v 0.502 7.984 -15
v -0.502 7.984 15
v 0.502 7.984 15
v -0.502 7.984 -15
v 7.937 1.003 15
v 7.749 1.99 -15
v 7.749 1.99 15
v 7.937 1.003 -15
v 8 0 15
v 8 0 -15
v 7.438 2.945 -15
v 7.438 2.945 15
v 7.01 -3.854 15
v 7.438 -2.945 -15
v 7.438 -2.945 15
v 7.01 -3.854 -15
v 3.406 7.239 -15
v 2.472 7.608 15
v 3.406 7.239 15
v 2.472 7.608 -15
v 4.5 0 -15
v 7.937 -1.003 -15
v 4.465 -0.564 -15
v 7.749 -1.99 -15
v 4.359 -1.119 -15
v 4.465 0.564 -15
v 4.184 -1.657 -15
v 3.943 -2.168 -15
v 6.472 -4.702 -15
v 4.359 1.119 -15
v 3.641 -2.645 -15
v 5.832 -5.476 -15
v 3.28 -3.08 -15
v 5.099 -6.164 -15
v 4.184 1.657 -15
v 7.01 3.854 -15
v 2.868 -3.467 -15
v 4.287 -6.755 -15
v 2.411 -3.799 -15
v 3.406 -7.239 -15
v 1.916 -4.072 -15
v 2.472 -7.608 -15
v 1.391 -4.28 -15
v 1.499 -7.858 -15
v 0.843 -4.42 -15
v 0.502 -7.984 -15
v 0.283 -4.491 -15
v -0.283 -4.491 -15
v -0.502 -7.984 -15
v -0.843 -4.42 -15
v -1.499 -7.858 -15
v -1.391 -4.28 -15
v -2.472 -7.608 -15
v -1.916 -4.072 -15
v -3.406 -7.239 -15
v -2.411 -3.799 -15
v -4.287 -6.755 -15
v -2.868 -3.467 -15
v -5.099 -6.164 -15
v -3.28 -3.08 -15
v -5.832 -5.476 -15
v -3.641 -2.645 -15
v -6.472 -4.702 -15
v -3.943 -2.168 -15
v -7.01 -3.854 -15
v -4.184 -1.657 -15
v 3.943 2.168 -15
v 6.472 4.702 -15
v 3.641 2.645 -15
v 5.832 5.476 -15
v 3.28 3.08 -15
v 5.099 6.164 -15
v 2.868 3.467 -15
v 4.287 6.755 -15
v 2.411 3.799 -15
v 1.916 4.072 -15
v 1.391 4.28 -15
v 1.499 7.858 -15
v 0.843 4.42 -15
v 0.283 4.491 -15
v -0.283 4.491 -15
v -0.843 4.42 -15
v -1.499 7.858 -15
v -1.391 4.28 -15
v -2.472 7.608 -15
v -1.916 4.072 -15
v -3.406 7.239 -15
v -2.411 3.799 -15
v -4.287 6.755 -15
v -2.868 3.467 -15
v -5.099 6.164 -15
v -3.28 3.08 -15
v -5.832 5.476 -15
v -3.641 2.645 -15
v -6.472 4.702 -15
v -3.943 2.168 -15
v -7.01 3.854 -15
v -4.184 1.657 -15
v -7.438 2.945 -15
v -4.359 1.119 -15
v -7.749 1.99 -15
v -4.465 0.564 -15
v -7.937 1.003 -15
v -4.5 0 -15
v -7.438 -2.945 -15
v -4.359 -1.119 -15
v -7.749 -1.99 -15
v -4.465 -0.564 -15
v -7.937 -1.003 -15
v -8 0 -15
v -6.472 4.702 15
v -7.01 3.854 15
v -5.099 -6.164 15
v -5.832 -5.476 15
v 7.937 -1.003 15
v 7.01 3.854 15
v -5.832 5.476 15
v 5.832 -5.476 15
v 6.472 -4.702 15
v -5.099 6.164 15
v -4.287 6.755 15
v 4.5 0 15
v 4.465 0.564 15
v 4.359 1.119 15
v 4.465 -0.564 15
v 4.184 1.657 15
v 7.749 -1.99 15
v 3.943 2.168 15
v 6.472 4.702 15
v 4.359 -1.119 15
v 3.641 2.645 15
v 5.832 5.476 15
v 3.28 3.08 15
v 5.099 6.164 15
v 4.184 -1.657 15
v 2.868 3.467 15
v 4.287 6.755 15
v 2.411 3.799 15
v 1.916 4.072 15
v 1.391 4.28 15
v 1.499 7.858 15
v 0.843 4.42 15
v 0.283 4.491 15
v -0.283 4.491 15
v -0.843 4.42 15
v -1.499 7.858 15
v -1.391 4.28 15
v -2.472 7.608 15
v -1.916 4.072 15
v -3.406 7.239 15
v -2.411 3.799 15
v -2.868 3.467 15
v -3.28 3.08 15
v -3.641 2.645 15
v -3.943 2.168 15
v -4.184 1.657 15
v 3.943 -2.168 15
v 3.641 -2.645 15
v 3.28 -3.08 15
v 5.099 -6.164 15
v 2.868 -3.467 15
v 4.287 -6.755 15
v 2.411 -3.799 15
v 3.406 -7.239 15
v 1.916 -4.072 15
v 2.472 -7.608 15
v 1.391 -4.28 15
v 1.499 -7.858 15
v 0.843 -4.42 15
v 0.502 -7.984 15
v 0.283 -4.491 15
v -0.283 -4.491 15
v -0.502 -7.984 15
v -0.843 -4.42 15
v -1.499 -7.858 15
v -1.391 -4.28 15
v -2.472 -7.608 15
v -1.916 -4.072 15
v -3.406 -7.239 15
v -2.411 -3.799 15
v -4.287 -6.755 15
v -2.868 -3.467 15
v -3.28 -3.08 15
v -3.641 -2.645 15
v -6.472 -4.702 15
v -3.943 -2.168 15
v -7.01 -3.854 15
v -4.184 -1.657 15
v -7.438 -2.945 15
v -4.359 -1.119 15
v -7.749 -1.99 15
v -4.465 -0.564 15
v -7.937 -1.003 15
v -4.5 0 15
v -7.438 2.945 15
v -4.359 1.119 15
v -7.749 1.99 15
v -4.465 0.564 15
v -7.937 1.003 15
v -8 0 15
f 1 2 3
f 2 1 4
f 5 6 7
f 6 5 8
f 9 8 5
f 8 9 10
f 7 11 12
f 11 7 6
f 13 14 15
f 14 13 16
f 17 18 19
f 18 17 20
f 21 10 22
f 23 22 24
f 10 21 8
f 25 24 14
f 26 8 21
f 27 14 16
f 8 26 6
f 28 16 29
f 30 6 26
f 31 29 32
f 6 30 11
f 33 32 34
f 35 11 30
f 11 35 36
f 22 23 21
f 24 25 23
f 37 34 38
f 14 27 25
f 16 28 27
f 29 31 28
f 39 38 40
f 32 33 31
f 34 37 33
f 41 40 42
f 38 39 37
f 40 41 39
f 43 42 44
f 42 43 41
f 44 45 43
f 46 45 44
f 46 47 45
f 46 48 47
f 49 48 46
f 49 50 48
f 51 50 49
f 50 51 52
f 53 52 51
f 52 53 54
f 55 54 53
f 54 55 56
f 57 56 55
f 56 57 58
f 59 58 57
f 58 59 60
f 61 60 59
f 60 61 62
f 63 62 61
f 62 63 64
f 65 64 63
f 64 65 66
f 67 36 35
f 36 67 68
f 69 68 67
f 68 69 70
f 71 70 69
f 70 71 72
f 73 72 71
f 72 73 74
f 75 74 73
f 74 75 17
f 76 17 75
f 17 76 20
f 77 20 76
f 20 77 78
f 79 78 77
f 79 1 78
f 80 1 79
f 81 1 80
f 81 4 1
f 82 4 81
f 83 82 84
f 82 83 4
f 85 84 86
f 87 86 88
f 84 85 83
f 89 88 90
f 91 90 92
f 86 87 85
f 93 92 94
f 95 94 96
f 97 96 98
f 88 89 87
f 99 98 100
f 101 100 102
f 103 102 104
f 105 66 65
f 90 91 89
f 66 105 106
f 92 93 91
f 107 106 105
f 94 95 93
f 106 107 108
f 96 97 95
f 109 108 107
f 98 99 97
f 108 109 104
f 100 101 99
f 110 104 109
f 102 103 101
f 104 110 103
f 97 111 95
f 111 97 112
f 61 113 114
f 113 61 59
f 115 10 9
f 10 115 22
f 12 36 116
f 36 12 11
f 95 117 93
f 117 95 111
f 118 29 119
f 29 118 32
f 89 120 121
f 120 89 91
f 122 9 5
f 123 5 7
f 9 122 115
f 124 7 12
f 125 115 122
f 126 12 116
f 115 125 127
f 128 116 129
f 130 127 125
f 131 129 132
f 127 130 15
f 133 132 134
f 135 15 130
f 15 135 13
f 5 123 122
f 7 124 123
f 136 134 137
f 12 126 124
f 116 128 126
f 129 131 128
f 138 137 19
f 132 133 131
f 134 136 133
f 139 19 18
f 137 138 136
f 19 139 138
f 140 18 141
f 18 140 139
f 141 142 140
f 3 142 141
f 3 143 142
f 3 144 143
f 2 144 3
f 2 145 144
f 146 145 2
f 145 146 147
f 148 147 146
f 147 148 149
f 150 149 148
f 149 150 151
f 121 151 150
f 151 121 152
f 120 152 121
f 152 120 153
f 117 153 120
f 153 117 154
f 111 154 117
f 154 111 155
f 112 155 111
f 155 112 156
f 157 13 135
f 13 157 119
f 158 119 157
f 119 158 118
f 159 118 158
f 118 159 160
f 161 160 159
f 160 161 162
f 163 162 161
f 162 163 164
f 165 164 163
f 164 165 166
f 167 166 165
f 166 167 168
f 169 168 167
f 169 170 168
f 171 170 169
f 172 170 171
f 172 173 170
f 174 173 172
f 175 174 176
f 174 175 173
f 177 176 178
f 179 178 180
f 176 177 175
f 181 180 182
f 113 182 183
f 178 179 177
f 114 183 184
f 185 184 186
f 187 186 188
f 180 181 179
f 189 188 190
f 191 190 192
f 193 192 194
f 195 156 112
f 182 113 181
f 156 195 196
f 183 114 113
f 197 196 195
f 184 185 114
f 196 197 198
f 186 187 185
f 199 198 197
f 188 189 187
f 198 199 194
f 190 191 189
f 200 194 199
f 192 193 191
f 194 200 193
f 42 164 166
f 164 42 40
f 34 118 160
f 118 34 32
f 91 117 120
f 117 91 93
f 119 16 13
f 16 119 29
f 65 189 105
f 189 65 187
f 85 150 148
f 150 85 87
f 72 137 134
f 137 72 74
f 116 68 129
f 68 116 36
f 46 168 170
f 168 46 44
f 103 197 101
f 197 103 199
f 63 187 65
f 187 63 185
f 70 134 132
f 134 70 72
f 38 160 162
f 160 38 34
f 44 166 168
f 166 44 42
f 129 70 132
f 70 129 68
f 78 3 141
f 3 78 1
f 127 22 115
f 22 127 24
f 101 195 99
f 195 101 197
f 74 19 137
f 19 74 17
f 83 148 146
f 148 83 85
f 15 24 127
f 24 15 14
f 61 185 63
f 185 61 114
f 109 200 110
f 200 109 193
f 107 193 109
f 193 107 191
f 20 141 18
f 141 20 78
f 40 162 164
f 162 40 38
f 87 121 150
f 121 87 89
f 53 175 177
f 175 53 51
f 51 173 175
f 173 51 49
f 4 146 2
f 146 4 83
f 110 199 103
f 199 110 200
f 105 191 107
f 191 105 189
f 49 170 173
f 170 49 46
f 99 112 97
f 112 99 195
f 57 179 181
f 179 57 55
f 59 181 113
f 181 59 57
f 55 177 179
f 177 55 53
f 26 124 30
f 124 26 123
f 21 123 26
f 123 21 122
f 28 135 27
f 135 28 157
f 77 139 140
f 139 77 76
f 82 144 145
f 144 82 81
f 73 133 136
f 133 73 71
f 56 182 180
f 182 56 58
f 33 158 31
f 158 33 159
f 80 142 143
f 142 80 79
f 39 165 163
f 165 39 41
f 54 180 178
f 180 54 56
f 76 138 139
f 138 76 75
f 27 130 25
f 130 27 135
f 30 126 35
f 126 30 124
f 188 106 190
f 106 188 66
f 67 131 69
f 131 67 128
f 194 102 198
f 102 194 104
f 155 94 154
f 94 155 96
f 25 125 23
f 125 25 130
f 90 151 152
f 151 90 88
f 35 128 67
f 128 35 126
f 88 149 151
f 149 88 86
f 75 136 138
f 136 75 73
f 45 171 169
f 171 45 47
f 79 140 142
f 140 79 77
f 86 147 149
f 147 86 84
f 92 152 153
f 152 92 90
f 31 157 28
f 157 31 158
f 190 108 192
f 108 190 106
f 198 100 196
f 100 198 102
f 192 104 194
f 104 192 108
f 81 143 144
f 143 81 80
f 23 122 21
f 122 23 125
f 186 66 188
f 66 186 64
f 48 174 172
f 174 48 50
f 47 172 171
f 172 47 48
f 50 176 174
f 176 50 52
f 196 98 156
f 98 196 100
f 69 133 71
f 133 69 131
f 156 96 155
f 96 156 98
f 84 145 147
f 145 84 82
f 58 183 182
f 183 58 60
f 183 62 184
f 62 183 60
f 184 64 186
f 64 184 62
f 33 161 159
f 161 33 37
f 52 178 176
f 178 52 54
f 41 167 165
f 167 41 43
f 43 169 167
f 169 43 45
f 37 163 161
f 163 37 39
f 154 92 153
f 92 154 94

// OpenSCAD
$fn = 50;


difference() {
	union() {
		translate(v = [0, 0, -15.0000000000]) {
			cylinder(h = 30, r = 8.0000000000);
		}
	}
	union() {
		translate(v = [0, 0, -100.0000000000]) {
			cylinder(h = 200, r = 4.5000000000);
		}
	}
}
